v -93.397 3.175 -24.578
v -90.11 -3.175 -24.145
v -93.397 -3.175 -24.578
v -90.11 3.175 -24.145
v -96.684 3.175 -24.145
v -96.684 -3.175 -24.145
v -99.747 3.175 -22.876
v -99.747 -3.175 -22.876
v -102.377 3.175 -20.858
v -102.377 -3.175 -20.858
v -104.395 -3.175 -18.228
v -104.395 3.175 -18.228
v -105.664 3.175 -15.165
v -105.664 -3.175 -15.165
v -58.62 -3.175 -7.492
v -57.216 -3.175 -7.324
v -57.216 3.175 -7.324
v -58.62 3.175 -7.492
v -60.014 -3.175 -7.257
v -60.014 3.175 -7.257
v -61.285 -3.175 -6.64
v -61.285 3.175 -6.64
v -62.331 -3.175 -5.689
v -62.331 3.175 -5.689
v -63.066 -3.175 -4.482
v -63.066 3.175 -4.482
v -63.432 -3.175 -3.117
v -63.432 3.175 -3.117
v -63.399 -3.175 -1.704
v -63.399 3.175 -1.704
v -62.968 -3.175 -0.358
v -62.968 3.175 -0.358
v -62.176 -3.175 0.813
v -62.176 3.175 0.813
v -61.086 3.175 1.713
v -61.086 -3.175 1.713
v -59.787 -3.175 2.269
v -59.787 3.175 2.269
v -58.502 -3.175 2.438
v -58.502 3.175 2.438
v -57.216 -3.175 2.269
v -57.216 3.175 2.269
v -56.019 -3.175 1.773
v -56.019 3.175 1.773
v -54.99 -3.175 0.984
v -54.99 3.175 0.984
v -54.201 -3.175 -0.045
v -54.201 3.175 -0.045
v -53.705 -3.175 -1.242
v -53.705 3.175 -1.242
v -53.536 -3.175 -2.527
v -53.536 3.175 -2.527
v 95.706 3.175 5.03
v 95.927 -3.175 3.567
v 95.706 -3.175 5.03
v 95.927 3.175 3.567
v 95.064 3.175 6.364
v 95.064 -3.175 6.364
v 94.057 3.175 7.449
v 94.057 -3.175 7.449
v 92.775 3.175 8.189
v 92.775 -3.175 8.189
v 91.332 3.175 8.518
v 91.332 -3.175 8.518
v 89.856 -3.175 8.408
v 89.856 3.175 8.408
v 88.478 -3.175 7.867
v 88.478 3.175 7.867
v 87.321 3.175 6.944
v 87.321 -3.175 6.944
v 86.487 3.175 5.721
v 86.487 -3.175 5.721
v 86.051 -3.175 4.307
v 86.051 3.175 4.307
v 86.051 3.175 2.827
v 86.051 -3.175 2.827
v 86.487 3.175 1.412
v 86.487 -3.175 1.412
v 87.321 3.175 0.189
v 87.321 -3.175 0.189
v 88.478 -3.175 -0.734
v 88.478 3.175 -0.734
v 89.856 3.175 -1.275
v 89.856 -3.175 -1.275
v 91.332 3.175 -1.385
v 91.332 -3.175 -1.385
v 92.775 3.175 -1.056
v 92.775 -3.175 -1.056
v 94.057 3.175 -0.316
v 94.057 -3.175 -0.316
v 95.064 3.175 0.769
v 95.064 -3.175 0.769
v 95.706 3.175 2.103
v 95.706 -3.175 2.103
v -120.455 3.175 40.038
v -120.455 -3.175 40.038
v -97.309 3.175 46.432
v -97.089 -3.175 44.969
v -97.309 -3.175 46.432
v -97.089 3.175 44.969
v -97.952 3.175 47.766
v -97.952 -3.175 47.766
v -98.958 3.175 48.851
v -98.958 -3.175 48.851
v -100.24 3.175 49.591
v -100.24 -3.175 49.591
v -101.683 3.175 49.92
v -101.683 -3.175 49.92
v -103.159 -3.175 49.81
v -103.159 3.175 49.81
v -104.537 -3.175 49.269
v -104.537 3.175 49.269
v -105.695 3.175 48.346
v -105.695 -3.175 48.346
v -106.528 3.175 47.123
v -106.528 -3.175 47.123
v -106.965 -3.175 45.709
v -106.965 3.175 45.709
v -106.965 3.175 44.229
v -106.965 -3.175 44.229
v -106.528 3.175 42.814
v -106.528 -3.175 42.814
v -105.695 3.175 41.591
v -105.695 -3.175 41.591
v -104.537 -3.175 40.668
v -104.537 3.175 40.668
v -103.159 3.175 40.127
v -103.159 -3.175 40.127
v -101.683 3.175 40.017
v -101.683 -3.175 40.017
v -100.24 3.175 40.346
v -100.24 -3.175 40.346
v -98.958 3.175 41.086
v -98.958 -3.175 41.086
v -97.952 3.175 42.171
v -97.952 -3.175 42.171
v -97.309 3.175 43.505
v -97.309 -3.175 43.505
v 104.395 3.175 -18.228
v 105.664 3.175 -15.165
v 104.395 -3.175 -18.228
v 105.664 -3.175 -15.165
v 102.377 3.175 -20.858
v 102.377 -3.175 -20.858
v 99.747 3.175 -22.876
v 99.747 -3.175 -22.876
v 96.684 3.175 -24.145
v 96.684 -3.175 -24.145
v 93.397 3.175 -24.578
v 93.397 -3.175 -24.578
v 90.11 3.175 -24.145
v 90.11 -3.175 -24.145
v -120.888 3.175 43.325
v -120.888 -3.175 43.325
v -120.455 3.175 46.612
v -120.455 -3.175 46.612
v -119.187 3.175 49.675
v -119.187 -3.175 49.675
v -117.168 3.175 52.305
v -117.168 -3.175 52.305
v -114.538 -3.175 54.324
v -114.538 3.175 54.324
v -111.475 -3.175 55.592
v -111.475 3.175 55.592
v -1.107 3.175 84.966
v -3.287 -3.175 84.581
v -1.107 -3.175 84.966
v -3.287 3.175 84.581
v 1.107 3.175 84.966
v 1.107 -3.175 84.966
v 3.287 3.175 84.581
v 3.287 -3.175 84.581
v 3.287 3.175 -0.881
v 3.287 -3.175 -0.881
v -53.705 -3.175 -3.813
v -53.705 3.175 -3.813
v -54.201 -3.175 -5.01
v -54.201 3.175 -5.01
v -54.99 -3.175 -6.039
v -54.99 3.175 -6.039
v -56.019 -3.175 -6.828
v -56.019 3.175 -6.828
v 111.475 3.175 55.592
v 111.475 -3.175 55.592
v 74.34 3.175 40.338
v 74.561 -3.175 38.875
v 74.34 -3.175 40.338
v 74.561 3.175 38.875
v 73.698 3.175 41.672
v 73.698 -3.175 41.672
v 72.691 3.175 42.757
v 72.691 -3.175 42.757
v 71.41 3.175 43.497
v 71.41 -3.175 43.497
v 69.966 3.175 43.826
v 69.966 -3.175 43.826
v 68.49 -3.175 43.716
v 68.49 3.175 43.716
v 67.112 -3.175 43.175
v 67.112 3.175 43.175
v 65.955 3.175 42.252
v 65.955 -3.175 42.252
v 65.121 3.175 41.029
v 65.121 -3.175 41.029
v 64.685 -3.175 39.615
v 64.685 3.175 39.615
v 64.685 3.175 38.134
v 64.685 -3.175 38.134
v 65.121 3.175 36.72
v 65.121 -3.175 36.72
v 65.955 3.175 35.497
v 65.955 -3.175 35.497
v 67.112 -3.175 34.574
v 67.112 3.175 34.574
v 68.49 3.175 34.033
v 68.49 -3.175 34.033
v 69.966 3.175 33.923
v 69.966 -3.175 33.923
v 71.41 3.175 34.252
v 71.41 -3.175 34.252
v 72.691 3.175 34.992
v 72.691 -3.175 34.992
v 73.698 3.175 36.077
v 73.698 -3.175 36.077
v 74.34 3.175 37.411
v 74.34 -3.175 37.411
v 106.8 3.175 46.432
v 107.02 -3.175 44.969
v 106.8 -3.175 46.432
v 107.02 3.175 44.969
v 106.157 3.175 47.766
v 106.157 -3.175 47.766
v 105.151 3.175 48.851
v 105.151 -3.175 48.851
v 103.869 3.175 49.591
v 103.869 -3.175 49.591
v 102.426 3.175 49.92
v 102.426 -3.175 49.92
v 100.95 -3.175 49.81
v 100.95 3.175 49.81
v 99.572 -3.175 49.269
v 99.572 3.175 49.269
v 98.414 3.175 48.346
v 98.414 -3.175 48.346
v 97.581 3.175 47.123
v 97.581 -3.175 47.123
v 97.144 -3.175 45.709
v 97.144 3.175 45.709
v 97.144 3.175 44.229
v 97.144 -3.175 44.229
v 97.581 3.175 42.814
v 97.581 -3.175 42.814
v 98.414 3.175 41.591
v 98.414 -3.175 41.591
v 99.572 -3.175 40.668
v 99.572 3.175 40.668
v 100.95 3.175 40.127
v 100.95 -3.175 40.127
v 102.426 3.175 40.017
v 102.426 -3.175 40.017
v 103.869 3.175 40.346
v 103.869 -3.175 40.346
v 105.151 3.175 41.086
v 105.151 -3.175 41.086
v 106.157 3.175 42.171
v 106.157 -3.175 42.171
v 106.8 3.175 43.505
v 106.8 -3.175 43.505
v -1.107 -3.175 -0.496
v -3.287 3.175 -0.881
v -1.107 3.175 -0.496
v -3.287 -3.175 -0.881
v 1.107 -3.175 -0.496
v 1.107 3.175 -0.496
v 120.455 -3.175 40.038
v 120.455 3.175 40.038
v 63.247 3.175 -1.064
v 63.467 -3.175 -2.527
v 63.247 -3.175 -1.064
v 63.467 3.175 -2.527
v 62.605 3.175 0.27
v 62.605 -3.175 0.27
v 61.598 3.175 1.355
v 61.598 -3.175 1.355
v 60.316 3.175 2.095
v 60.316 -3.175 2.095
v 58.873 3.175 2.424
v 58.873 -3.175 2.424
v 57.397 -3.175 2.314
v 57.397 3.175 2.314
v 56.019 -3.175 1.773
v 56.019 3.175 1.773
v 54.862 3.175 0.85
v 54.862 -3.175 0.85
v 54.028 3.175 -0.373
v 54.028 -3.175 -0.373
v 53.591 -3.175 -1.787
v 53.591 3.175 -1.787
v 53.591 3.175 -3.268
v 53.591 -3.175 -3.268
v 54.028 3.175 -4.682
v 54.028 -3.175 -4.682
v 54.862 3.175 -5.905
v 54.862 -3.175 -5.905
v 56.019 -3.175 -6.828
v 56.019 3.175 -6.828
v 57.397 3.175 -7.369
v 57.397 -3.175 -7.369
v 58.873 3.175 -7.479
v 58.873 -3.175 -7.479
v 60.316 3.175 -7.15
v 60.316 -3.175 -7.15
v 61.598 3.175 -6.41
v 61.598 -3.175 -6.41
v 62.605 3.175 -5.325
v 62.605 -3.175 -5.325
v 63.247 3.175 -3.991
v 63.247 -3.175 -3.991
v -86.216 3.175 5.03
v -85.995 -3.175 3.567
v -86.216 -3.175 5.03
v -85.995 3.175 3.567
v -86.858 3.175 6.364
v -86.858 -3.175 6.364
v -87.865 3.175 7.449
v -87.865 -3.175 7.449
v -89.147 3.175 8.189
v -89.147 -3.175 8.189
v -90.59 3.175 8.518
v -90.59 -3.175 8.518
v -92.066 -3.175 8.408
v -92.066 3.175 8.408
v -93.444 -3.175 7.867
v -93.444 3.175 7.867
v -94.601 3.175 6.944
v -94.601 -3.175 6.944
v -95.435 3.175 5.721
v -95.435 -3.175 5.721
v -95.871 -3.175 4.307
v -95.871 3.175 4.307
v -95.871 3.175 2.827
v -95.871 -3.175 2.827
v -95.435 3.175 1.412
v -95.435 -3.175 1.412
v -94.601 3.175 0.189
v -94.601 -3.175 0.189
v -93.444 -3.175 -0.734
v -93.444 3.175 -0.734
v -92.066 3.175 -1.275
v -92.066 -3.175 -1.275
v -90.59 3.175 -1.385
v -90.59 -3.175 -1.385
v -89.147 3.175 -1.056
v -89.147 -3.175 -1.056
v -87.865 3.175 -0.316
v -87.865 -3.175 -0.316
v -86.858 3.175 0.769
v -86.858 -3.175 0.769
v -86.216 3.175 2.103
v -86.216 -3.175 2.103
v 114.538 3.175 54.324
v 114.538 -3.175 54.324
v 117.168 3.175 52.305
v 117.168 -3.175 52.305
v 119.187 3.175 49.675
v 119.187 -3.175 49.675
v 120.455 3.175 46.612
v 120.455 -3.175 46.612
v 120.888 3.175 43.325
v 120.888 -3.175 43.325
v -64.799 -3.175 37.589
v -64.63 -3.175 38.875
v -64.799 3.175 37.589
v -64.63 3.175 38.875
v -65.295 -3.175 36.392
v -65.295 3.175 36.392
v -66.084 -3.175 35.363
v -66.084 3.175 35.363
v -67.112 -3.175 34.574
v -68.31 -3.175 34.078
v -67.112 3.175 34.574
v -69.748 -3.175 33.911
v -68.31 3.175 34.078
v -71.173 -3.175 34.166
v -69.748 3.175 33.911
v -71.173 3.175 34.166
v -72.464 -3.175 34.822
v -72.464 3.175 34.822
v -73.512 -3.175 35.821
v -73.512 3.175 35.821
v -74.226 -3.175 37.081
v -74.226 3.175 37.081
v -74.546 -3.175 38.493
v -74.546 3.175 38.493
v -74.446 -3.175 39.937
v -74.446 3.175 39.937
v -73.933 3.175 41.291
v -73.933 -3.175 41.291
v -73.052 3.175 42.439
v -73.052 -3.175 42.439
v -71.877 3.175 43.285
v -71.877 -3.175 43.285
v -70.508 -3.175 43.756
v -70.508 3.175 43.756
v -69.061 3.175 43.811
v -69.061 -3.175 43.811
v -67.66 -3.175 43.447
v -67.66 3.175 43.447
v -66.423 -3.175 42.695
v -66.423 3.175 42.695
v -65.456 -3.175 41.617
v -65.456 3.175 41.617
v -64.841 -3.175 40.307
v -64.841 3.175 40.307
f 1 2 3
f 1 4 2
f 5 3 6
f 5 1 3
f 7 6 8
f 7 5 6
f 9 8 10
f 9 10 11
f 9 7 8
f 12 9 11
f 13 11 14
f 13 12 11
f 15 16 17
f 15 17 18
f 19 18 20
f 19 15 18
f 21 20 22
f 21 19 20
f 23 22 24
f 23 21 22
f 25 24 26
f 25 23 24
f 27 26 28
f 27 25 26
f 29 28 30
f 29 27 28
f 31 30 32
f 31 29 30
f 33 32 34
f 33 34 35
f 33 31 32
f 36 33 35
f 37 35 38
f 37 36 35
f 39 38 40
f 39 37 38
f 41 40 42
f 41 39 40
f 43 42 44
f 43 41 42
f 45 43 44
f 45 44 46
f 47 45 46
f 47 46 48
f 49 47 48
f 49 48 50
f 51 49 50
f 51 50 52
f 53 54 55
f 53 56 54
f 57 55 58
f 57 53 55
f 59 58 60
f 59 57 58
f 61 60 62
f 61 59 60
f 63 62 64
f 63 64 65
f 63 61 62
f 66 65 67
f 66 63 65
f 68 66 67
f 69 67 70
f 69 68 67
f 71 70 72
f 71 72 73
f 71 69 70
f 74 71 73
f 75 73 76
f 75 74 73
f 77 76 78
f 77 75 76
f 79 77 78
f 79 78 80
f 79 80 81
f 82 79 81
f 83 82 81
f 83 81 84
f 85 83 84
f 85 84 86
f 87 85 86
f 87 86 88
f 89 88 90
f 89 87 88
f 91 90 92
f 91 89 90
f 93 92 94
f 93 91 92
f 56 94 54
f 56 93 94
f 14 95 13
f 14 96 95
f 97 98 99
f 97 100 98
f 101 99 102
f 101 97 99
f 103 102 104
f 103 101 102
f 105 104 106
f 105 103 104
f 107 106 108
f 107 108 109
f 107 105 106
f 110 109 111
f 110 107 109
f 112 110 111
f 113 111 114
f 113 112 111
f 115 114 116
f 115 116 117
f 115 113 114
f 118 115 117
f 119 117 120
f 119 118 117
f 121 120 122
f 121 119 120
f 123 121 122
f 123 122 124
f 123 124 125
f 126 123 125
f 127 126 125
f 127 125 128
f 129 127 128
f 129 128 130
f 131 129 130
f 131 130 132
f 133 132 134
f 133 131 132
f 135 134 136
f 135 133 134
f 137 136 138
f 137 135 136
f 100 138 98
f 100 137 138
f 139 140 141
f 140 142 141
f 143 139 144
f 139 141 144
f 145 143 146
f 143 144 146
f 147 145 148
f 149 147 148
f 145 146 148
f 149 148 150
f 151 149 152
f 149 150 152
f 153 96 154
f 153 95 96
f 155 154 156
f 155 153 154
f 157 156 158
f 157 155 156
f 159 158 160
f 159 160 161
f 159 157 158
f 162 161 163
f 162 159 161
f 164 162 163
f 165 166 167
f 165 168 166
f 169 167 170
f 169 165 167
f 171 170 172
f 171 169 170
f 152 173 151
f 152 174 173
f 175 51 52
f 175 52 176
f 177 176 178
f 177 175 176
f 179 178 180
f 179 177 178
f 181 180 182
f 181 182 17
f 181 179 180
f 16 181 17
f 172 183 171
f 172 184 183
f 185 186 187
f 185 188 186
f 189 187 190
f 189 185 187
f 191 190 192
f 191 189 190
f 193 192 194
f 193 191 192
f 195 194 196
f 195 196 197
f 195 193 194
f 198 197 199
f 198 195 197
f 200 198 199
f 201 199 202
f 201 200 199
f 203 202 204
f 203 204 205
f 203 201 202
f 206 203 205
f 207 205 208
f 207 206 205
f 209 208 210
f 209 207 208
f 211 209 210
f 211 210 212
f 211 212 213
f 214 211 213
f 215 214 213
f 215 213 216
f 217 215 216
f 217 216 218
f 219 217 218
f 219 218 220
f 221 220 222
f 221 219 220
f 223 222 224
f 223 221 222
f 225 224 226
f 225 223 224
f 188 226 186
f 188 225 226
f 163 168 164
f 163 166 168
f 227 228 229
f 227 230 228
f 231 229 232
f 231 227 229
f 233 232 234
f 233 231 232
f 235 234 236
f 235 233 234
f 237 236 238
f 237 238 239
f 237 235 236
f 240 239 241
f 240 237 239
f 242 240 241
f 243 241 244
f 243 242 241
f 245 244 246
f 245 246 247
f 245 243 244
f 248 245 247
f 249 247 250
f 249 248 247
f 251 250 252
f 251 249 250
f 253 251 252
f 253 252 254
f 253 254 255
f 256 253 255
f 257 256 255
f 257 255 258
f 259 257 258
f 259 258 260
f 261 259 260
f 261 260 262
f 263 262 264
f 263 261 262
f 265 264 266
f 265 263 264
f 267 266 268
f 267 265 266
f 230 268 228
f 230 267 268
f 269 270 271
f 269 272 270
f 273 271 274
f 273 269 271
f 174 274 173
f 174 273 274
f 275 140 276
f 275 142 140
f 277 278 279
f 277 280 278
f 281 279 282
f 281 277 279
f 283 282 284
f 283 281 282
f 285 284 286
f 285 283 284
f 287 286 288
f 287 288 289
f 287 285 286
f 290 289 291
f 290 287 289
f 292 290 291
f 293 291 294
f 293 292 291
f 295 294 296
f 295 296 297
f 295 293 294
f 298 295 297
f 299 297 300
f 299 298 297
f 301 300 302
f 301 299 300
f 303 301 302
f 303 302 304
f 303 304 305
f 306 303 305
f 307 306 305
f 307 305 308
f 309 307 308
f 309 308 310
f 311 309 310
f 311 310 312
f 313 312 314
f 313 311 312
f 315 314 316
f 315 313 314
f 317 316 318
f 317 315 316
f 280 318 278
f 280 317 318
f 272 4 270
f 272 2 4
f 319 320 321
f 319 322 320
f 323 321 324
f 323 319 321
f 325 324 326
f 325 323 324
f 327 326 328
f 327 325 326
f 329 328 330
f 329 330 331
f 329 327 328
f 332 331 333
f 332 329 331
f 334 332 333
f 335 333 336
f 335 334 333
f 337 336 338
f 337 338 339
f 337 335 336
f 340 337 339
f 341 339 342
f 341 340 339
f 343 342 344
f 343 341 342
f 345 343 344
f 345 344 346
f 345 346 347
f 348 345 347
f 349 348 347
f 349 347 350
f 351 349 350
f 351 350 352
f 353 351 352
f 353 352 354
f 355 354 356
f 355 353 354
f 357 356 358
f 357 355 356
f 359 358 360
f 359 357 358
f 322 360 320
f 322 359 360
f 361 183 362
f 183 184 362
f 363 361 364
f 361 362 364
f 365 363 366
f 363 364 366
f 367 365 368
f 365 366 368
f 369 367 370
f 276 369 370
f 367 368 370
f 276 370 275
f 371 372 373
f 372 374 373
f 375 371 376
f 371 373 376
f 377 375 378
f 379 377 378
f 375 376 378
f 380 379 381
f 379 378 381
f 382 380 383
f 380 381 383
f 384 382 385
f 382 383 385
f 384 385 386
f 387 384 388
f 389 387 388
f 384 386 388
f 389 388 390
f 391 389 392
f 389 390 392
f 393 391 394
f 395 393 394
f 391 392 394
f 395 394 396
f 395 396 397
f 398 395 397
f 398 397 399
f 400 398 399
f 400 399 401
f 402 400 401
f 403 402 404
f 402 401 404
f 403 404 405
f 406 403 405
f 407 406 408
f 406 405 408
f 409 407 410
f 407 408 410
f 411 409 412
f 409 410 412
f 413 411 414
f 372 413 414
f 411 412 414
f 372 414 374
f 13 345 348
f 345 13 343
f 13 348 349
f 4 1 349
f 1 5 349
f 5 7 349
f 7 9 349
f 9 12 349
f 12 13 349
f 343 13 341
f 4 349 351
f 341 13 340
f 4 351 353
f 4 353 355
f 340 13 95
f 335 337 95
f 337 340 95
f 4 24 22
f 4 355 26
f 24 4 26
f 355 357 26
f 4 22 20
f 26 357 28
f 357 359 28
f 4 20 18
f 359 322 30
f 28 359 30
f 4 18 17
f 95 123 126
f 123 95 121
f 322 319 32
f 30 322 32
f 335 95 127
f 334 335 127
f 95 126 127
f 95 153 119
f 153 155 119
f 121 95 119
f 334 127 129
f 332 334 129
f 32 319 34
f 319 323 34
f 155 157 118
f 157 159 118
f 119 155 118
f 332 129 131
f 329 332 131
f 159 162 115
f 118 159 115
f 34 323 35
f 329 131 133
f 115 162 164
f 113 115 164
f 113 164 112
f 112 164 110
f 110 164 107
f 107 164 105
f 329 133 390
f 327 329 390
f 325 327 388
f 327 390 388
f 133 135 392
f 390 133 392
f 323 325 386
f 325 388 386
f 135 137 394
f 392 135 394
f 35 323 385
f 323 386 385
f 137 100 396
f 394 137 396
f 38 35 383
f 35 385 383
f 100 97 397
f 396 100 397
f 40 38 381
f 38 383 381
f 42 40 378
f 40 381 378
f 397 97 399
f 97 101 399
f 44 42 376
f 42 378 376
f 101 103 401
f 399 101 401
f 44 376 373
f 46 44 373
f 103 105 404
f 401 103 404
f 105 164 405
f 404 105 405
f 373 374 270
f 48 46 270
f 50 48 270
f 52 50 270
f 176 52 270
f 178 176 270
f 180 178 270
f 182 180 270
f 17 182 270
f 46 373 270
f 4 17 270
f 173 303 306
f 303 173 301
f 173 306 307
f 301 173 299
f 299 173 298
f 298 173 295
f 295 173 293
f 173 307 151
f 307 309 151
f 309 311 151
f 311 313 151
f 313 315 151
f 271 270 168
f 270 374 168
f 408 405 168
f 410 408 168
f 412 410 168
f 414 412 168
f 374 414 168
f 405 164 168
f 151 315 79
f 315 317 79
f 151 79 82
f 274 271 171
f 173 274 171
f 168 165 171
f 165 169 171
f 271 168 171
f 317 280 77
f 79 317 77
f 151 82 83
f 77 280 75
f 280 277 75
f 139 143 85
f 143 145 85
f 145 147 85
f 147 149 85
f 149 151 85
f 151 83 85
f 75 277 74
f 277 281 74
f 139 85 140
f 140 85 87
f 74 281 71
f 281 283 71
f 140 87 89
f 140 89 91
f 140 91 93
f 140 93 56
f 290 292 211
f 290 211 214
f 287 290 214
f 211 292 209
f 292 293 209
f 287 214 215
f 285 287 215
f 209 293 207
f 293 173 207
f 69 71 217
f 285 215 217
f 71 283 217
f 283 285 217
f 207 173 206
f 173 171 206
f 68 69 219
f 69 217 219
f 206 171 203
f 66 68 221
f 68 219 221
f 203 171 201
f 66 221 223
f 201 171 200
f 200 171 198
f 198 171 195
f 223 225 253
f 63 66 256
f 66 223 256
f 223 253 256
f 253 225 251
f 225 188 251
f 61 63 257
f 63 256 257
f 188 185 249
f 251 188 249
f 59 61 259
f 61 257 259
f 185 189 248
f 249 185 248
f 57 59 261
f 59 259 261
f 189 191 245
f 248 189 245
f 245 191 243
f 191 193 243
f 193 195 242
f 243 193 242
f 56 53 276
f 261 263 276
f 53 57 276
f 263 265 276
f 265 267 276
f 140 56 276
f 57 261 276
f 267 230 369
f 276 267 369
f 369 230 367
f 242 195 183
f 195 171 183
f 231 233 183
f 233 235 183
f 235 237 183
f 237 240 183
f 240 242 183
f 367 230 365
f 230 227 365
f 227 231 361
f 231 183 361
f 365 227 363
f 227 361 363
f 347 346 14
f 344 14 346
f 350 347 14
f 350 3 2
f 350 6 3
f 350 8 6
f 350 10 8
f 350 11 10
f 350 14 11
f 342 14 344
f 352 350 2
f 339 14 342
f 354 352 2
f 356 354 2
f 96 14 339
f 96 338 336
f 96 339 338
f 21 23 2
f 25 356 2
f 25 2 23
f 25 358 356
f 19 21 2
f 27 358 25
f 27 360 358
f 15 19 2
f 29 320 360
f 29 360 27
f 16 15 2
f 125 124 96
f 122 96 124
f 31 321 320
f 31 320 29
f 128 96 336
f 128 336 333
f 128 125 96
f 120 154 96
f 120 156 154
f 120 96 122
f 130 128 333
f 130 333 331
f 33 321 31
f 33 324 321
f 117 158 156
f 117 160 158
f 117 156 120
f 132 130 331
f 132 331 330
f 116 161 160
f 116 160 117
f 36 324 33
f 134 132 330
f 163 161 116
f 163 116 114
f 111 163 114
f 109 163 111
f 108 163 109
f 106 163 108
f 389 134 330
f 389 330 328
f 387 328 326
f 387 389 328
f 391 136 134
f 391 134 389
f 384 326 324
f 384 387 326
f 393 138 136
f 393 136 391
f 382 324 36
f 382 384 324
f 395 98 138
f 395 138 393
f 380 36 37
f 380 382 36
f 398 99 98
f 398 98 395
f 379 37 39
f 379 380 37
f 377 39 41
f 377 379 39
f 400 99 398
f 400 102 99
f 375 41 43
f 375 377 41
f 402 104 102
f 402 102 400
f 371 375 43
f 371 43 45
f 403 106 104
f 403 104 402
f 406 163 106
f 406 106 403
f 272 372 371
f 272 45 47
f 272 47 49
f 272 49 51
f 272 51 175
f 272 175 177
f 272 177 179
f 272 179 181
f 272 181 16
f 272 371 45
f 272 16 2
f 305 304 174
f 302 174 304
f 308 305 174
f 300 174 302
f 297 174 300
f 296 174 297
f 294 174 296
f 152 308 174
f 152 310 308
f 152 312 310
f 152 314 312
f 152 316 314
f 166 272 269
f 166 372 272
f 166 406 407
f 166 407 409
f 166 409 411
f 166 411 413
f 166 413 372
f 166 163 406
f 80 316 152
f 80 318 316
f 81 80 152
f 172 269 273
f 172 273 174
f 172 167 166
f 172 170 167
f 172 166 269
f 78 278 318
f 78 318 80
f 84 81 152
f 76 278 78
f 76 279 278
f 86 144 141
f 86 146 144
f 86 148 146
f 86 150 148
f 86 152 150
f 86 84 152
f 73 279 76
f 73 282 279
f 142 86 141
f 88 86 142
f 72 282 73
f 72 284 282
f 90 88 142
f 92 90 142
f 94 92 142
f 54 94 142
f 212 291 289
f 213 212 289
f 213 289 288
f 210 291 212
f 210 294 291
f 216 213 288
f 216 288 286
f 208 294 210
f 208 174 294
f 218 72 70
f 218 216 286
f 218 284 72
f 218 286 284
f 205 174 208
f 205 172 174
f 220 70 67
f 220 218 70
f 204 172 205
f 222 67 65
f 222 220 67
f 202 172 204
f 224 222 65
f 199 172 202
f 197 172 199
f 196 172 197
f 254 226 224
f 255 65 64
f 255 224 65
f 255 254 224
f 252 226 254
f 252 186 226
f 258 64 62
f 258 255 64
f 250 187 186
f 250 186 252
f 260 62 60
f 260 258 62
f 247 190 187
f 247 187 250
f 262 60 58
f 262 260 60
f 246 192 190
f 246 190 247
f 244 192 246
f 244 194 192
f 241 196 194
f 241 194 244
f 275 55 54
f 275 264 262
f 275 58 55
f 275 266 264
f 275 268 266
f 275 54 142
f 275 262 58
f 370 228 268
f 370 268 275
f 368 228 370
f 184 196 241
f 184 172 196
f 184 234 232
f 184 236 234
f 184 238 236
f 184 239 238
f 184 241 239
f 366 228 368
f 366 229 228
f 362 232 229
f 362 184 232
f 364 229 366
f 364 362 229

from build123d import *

# Parameters (mm, degrees)
F0_R     = 4.9657
F1_DEPTH = 3.175
F2_R     = 12.7


with BuildPart() as f1:
    # F0 (on Front) → F1 (new body, symmetric)
    with BuildSketch(Plane.XZ):
        Polygon((-55.2147151877, -14.7947383449), (0, 0), (0, 85.4620486929), (-123.7423807387, 52.3053777044), (-102.3768685655, -27.4317992558), align=None)
        with BuildLine():
            ThreePointArc((-53.5360170605, -2.527480351), (-54.5621623786, -5.550406979), (-57.2164993282, -7.3239782266))
            ThreePointArc((-57.2164993282, -7.3239782266), (-63.2982149361, -3.8126980833), (-59.7869347928, 2.2690175246))
            ThreePointArc((-59.7869347928, 2.2690175246), (-55.4787904325, 1.4120743309), (-53.5360170605, -2.527480351))
        make_face(mode=Mode.SUBTRACT)
        with Locations((-90.9608605544, 3.5666267904)):
            Circle(F0_R, mode=Mode.SUBTRACT)
        with BuildLine():
            ThreePointArc((-64.6296483812, 38.8745153783), (-65.6557936993, 35.8515887503), (-68.310130649, 34.0780175027))
            ThreePointArc((-68.310130649, 34.0780175027), (-73.5349030631, 41.8974420064), (-64.6296483812, 38.8745153783))
        make_face(mode=Mode.SUBTRACT)
        with Locations((-102.0544918751, 44.9686225197)):
            Circle(F0_R, mode=Mode.SUBTRACT)
        Polygon((0, 85.4620486929), (0, 0), (102.3768685655, -27.4317992558), (123.7423807387, 52.3053777044), align=None)
        with Locations((58.5017170605, -2.527480351)):
            Circle(F0_R, mode=Mode.SUBTRACT)
        with Locations((90.9608605544, 3.5666267904)):
            Circle(F0_R, mode=Mode.SUBTRACT)
        with Locations((69.5953483812, 38.8745153783)):
            Circle(F0_R, mode=Mode.SUBTRACT)
        with Locations((102.0544918751, 44.9686225197)):
            Circle(F0_R, mode=Mode.SUBTRACT)
    extrude(amount=F1_DEPTH, both=True)

    # F2
    f2_edges = [f1.edges().sort_by_distance(p)[0] for p in [
        (-123.742381, 0, 52.305378),
        (0, 0, 85.462049),
        (0, 0, 0),
        (102.376869, 0, -27.431799),
        (123.742381, 0, 52.305378),
        (-102.376869, 0, -27.431799),
    ]]
    fillet(f2_edges, radius=F2_R)


solid = f1.part
